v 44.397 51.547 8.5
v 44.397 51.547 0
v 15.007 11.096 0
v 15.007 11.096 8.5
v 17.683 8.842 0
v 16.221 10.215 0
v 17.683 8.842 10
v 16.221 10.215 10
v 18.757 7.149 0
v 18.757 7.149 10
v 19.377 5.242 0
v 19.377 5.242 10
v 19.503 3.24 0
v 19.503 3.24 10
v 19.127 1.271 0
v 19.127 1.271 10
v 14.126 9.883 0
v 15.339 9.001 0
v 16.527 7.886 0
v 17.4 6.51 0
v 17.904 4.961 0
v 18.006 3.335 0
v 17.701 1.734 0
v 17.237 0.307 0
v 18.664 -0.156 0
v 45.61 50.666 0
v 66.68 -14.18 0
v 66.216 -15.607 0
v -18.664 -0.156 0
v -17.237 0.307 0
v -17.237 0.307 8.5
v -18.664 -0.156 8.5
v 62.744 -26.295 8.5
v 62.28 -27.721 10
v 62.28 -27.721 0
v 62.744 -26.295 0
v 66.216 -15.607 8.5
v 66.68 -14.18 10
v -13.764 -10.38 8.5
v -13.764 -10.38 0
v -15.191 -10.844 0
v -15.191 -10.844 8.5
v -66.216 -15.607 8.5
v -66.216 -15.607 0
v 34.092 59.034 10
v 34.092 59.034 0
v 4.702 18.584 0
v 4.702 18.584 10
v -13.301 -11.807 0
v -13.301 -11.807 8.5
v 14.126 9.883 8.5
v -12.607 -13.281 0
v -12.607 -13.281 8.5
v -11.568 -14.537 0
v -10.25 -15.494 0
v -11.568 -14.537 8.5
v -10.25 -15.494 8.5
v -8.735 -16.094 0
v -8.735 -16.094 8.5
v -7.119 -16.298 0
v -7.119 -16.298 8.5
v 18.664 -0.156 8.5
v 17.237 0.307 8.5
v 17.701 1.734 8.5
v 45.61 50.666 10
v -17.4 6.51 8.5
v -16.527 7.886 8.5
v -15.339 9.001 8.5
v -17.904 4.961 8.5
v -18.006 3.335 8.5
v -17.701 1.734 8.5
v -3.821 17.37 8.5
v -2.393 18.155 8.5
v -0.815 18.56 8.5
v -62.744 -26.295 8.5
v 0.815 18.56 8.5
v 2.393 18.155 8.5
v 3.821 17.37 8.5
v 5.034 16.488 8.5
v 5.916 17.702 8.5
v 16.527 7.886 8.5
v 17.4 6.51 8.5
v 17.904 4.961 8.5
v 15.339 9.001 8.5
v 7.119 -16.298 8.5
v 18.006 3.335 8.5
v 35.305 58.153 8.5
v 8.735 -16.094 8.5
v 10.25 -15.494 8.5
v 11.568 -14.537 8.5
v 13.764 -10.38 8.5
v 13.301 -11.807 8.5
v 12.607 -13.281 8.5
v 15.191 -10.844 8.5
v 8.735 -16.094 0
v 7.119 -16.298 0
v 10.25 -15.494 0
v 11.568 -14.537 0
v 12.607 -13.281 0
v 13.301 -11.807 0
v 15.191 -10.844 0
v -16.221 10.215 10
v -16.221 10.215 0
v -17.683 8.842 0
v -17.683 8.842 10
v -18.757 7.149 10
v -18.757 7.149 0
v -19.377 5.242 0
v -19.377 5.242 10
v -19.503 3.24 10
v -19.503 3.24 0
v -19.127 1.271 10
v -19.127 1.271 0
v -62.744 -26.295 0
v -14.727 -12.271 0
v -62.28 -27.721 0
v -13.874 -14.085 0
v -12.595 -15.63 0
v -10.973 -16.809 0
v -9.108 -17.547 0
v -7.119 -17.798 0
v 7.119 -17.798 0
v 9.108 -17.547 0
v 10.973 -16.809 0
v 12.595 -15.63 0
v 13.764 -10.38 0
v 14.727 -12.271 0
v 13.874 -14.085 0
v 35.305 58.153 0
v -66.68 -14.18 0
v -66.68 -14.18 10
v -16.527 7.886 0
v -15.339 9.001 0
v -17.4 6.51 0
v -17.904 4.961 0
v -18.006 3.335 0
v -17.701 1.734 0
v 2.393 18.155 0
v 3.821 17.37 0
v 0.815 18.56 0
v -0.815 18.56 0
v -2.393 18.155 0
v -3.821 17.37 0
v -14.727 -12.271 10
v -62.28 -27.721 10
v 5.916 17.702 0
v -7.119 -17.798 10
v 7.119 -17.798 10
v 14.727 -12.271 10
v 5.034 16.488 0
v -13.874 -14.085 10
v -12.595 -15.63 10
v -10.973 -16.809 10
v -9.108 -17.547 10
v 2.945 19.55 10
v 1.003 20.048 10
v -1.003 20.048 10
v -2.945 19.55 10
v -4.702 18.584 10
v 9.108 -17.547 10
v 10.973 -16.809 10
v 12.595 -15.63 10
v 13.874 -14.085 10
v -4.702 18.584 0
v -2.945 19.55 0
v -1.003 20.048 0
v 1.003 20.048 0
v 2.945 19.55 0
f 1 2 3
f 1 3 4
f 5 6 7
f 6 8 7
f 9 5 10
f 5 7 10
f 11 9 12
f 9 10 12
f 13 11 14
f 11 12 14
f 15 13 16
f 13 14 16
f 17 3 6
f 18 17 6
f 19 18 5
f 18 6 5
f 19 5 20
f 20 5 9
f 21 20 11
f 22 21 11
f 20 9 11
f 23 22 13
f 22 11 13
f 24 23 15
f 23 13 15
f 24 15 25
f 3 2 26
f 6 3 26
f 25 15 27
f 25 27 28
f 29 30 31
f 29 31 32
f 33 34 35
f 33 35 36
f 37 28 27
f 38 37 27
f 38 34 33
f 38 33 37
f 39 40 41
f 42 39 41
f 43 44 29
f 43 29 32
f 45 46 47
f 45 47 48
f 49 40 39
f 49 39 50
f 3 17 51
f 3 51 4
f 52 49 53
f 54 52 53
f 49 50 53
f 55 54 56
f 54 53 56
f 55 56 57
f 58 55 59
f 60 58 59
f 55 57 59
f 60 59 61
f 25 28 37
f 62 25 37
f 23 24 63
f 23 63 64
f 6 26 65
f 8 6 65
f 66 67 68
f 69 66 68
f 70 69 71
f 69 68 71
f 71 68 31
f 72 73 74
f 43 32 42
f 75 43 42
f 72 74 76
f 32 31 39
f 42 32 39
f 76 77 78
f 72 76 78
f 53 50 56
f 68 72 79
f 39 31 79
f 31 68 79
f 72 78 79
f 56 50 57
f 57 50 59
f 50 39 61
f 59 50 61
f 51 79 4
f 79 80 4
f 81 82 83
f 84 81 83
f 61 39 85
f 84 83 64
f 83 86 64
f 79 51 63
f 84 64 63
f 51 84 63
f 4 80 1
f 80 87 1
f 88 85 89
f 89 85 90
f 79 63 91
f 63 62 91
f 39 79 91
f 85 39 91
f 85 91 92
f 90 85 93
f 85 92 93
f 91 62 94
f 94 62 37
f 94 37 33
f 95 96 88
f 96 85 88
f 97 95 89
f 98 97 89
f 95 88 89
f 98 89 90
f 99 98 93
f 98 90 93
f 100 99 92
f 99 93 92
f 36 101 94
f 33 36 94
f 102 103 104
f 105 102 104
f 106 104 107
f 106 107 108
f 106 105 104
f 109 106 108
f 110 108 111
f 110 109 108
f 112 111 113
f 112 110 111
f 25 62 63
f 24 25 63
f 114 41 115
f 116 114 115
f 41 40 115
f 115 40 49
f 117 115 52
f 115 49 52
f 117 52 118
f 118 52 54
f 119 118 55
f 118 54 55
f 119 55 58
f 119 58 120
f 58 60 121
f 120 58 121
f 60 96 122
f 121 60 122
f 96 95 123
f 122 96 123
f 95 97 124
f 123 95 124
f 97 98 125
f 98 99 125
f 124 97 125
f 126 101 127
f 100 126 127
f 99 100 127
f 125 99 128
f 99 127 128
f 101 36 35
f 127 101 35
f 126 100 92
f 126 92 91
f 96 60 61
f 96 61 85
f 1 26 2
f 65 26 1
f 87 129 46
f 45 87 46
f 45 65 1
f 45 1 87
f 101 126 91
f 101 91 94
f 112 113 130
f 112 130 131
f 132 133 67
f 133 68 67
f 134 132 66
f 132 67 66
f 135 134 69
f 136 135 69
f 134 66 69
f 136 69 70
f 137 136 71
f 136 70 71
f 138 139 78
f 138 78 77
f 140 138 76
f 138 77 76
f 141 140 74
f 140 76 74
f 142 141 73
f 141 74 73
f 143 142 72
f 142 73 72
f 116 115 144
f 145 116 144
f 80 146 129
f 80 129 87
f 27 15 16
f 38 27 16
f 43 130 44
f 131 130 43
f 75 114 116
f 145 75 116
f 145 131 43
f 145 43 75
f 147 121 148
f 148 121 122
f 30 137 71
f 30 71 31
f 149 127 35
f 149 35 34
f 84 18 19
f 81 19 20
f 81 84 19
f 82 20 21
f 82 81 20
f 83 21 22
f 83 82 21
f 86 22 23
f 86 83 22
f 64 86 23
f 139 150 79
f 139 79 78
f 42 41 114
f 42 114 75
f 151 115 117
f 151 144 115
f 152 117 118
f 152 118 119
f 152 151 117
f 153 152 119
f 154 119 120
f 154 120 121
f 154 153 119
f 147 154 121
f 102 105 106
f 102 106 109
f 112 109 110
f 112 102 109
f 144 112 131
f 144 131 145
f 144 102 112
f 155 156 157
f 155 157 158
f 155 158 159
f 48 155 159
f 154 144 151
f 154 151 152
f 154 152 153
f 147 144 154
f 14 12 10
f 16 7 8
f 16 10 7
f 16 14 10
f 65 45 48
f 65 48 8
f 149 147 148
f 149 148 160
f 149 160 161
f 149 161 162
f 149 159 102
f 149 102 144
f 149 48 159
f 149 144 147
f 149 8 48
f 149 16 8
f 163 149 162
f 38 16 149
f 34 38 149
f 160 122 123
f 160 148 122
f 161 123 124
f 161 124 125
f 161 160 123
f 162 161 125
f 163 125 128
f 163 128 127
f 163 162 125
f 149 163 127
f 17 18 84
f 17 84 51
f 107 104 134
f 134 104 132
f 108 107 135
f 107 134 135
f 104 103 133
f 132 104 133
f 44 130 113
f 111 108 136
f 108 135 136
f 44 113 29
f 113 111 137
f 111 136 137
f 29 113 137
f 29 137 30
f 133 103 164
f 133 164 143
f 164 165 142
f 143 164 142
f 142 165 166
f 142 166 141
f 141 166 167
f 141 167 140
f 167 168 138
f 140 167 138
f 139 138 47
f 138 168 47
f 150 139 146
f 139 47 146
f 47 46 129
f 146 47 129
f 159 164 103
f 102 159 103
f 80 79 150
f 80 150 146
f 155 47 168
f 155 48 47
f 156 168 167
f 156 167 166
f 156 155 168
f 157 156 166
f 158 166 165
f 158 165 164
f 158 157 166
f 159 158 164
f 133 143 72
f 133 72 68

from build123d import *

# Parameters (mm, degrees)
F1_DEPTH      = 10
F2_R          = 8
F3_T          = -1.5
F4_W          = 14.2378706528
F4_H          = 10
F5_DEPTH      = 50
F7_W          = 14.2378706528
F7_H          = 10
F8_DEPTH      = 50
F6_W          = 14.2378706528
F6_H          = 10
F9_DEPTH      = 50
F10_T         = 1.5
F10_T3_DEPTH  = 13
F10_T5_DEPTH  = 17.2378706528
F10_T7_DEPTH  = 17.2378706528
F10_T10_ANGLE = 72.000000001
F10_T12_ANGLE = 72.000000001
F10_T14_ANGLE = 72.000000001
F10_T16_ANGLE = 72.000000001
F10_T18_ANGLE = 72.000000001


# Not quite as in the source:
# - a shell that OpenCascade refuses in one call is made with other operations: the cavity is built on its own and cut out


with BuildPart() as f1:
    # F0 (on Top) → F1 (new body)
    with BuildSketch(Plane.XY):
        Polygon((20.9232433585, 6.7983738762), (0, 22), (-20.9232433585, 6.7983738762), (-12.9312755504, -17.7983738762), (12.9312755504, -17.7983738762), align=None)
    extrude(amount=F1_DEPTH)

    # F2
    f2_edges = [f1.edges().sort_by_distance(p)[0] for p in [
        (20.923243, 6.798374, 5),
        (0, 22, 5),
        (12.931276, -17.798374, 5),
        (-12.931276, -17.798374, 5),
        (-20.923243, 6.798374, 5),
    ]]
    fillet(f2_edges, radius=F2_R)

    # F3
    f3_openings = [f1.faces().sort_by_distance(p)[0] for p in [
        (0, 0, 0),
    ]]
    offset(amount=F3_T, openings=f3_openings)

    # F4 (on face) → F5 (join)
    with BuildSketch(Plane(origin=(16.9272594545, -5.5, 0), x_dir=(0.3090169944, 0.9510565163, 0), z_dir=(0.9510565163, -0.3090169944, 0))):
        with Locations((0, 5)):
            Rectangle(F4_W, F4_H)
    extrude(amount=F5_DEPTH)

    # F7 (on face) → F8 (join)
    with BuildSketch(Plane(origin=(10.4616216792, 14.3991869381, 0), x_dir=(-0.8090169944, 0.5877852523, 0), z_dir=(0.5877852523, 0.8090169944, 0))):
        with Locations((0, 5)):
            Rectangle(F7_W, F7_H)
    extrude(amount=F8_DEPTH)

    # F6 (on face) → F9 (join)
    with BuildSketch(Plane(origin=(-16.9272594545, -5.5, 0), x_dir=(0.3090169944, -0.9510565163, 0), z_dir=(-0.9510565163, -0.3090169944, 0))):
        with Locations((0, 5)):
            Rectangle(F6_W, F6_H)
    extrude(amount=F9_DEPTH)

    # F10: shell of thickness 1.5, made by hand


with BuildPart() as f10_core1:
    # F10_t2: copy of F1
    add(f1.part)

    # the walls: a layer under each face that stays
    f10_faces = [f10_core1.faces().sort_by_distance(p)[0] for p in [
        (0, 20.11145618, 5),
        (-10.4616216792, 14.3991869381, 5),
        (-19.1271314522, 6.2147817412, 5),
        (-11.8212173447, -16.2705098312, 5),
        (0, -17.7983738762, 5),
        (11.8212173447, -16.2705098312, 5),
        (38.5038003641, -19.9959346906, 5),
        (42.9035443596, -6.4549150281, 5),
        (19.1271314522, 6.2147817412, 5),
        (30.9155926475, 30.4402066006, 5),
        (19.3969133257, 38.8090169944, 5),
        (17.7005466777, 5.7512562497, 4.25),
        (10.9395394663, -15.0569843397, 4.25),
        (0, -16.2983738762, 4.25),
        (-10.9395394663, -15.0569843397, 4.25),
        (-17.7005466777, 5.7512562497, 4.25),
        (-9.5799438008, 13.1856614466, 4.25),
        (0, 18.61145618, 4.25),
        (0, 15.6565411519, 10),
        (-42.9035443596, -6.4549150281, 5),
        (-38.5038003641, -19.9959346906, 5),
        (0, 1.1565411519, 8.5),
    ]]
    thicken(f10_faces, amount=-F10_T, mode=Mode.SUBTRACT)

    # F10_s4 → F10_t3 (cut)
    with BuildSketch(Plane.XY.offset(-1.5)):
        Polygon((4.6989635422, 18.6045441687), (3.8206041399, 17.3700666434), (5.0341296315, 16.488388765), (5.9158075099, 17.7019142566), align=None)
        Polygon((-19.1460325548, 1.2801404241), (-17.7005466777, 1.7340353228), (-17.2370211862, 0.3074505484), (-18.6636059606, -0.1560749432), align=None)
        Polygon((-14.7370180496, -12.2894109339), (-13.3008026823, -11.8069843397), (-13.7643281739, -10.3803995652), (-15.1909129483, -10.8439250568), align=None)
        Polygon((14.7370180496, -12.2894109339), (13.3008026823, -11.8069843397), (13.7643281739, -10.3803995652), (15.1909129483, -10.8439250568), align=None)
        Polygon((19.1460325548, 1.2801404241), (18.6636059606, -0.1560749432), (17.2370211862, 0.3074505484), (17.7005466777, 1.7340353228), align=None)
        Polygon((16.2419133739, 10.2181002174), (15.3392834617, 9.0012562497), (14.1257579702, 9.8829341281), (15.0074358486, 11.0964596197), align=None)
    extrude(amount=F10_T3_DEPTH, mode=Mode.SUBTRACT)

    # F10_s6 → F10_t5 (cut)
    with BuildSketch(Plane.YZ.offset(-8.6189353264)):
        Polygon((-16.2833738762, 8.485), (-17.7983738762, 8.5), (-17.7983738762, 10), (-16.2983738762, 10), align=None)
    extrude(amount=F10_T5_DEPTH, mode=Mode.SUBTRACT)

    # F10_s8 → F10_t7 (cut)
    with BuildSketch(Plane(origin=(6.9728651525, 5.0660830753, 0), x_dir=(0, 0, 1), z_dir=(-0.8090169944, -0.5877852523, 0))):
        Polygon((8.485, 16.2833738762), (8.5, 17.7983738762), (10, 17.7983738762), (10, 16.2983738762), align=None)
    extrude(amount=F10_T7_DEPTH, mode=Mode.SUBTRACT)

    # F10_s9 → F10_t10 (revolve, cut)
    with BuildSketch(Plane(origin=(2.1998719977, 6.7705098312, 0), x_dir=(0, 0, 1), z_dir=(-0.3090169944, -0.9510565163, 0))):
        Polygon((8.485, -16.2833738762), (8.5, -17.7983738762), (10, -17.7983738762), (10, -16.2983738762), align=None)
    revolve(axis=Axis((11.5186793218, 3.7426457862, 8.5), (0, 0, 1)), revolution_arc=F10_T10_ANGLE, mode=Mode.SUBTRACT)

    # F10_s11 → F10_t12 (revolve, cut)
    with BuildSketch(Plane.YZ.offset(7.1189353264)):
        Polygon((-16.2833738762, 8.485), (-17.7983738762, 8.5), (-17.7983738762, 10), (-16.2983738762, 10), align=None)
    revolve(axis=Axis((7.1189353264, -9.7983738762, 8.5), (0, 0, 1)), revolution_arc=F10_T12_ANGLE, mode=Mode.SUBTRACT)

    # F10_s13 → F10_t14 (revolve, cut)
    with BuildSketch(Plane(origin=(2.1998719977, -6.7705098312, 0), x_dir=(0, 0, 1), z_dir=(-0.3090169944, 0.9510565163, 0))):
        Polygon((8.485, -16.2833738762), (8.5, -17.7983738762), (10, -17.7983738762), (10, -16.2983738762), align=None)
    revolve(axis=Axis((-7.1189353264, -9.7983738762, 8.5), (0, 0, 1)), revolution_arc=F10_T14_ANGLE, mode=Mode.SUBTRACT)

    # F10_s15 → F10_t16 (revolve, cut)
    with BuildSketch(Plane(origin=(-5.7593396609, -4.1844051969, 0), x_dir=(0, 0, 1), z_dir=(0.8090169944, 0.5877852523, 0))):
        Polygon((8.485, -16.2833738762), (8.5, -17.7983738762), (10, -17.7983738762), (10, -16.2983738762), align=None)
    revolve(axis=Axis((-11.5186793218, 3.7426457862, 8.5), (0, 0, 1)), revolution_arc=F10_T16_ANGLE, mode=Mode.SUBTRACT)

    # F10_s17 → F10_t18 (revolve, cut)
    with BuildSketch(Plane(origin=(-5.7593396609, 4.1844051969, 0), x_dir=(0, 0, 1), z_dir=(0.8090169944, -0.5877852523, 0))):
        Polygon((8.485, -16.2833738762), (8.5, -17.7983738762), (10, -17.7983738762), (10, -16.2983738762), align=None)
    revolve(axis=Axis((0, 12.11145618, 8.5), (0, 0, 1)), revolution_arc=F10_T18_ANGLE, mode=Mode.SUBTRACT)


with BuildPart() as f1_1:
    add(f1.part)

    # what is left inside the walls is the cavity
    f10_cavity = [f10_core1.part.solids().sort_by_distance(p)[0] for p in [
        (24.715414, 25.972877, 0.015),
        (39.99038, -17.427366, 0.015),
        (-39.99038, -17.427366, 0.015),
    ]]
    add(f10_cavity, mode=Mode.SUBTRACT)


solid = f1_1.part
